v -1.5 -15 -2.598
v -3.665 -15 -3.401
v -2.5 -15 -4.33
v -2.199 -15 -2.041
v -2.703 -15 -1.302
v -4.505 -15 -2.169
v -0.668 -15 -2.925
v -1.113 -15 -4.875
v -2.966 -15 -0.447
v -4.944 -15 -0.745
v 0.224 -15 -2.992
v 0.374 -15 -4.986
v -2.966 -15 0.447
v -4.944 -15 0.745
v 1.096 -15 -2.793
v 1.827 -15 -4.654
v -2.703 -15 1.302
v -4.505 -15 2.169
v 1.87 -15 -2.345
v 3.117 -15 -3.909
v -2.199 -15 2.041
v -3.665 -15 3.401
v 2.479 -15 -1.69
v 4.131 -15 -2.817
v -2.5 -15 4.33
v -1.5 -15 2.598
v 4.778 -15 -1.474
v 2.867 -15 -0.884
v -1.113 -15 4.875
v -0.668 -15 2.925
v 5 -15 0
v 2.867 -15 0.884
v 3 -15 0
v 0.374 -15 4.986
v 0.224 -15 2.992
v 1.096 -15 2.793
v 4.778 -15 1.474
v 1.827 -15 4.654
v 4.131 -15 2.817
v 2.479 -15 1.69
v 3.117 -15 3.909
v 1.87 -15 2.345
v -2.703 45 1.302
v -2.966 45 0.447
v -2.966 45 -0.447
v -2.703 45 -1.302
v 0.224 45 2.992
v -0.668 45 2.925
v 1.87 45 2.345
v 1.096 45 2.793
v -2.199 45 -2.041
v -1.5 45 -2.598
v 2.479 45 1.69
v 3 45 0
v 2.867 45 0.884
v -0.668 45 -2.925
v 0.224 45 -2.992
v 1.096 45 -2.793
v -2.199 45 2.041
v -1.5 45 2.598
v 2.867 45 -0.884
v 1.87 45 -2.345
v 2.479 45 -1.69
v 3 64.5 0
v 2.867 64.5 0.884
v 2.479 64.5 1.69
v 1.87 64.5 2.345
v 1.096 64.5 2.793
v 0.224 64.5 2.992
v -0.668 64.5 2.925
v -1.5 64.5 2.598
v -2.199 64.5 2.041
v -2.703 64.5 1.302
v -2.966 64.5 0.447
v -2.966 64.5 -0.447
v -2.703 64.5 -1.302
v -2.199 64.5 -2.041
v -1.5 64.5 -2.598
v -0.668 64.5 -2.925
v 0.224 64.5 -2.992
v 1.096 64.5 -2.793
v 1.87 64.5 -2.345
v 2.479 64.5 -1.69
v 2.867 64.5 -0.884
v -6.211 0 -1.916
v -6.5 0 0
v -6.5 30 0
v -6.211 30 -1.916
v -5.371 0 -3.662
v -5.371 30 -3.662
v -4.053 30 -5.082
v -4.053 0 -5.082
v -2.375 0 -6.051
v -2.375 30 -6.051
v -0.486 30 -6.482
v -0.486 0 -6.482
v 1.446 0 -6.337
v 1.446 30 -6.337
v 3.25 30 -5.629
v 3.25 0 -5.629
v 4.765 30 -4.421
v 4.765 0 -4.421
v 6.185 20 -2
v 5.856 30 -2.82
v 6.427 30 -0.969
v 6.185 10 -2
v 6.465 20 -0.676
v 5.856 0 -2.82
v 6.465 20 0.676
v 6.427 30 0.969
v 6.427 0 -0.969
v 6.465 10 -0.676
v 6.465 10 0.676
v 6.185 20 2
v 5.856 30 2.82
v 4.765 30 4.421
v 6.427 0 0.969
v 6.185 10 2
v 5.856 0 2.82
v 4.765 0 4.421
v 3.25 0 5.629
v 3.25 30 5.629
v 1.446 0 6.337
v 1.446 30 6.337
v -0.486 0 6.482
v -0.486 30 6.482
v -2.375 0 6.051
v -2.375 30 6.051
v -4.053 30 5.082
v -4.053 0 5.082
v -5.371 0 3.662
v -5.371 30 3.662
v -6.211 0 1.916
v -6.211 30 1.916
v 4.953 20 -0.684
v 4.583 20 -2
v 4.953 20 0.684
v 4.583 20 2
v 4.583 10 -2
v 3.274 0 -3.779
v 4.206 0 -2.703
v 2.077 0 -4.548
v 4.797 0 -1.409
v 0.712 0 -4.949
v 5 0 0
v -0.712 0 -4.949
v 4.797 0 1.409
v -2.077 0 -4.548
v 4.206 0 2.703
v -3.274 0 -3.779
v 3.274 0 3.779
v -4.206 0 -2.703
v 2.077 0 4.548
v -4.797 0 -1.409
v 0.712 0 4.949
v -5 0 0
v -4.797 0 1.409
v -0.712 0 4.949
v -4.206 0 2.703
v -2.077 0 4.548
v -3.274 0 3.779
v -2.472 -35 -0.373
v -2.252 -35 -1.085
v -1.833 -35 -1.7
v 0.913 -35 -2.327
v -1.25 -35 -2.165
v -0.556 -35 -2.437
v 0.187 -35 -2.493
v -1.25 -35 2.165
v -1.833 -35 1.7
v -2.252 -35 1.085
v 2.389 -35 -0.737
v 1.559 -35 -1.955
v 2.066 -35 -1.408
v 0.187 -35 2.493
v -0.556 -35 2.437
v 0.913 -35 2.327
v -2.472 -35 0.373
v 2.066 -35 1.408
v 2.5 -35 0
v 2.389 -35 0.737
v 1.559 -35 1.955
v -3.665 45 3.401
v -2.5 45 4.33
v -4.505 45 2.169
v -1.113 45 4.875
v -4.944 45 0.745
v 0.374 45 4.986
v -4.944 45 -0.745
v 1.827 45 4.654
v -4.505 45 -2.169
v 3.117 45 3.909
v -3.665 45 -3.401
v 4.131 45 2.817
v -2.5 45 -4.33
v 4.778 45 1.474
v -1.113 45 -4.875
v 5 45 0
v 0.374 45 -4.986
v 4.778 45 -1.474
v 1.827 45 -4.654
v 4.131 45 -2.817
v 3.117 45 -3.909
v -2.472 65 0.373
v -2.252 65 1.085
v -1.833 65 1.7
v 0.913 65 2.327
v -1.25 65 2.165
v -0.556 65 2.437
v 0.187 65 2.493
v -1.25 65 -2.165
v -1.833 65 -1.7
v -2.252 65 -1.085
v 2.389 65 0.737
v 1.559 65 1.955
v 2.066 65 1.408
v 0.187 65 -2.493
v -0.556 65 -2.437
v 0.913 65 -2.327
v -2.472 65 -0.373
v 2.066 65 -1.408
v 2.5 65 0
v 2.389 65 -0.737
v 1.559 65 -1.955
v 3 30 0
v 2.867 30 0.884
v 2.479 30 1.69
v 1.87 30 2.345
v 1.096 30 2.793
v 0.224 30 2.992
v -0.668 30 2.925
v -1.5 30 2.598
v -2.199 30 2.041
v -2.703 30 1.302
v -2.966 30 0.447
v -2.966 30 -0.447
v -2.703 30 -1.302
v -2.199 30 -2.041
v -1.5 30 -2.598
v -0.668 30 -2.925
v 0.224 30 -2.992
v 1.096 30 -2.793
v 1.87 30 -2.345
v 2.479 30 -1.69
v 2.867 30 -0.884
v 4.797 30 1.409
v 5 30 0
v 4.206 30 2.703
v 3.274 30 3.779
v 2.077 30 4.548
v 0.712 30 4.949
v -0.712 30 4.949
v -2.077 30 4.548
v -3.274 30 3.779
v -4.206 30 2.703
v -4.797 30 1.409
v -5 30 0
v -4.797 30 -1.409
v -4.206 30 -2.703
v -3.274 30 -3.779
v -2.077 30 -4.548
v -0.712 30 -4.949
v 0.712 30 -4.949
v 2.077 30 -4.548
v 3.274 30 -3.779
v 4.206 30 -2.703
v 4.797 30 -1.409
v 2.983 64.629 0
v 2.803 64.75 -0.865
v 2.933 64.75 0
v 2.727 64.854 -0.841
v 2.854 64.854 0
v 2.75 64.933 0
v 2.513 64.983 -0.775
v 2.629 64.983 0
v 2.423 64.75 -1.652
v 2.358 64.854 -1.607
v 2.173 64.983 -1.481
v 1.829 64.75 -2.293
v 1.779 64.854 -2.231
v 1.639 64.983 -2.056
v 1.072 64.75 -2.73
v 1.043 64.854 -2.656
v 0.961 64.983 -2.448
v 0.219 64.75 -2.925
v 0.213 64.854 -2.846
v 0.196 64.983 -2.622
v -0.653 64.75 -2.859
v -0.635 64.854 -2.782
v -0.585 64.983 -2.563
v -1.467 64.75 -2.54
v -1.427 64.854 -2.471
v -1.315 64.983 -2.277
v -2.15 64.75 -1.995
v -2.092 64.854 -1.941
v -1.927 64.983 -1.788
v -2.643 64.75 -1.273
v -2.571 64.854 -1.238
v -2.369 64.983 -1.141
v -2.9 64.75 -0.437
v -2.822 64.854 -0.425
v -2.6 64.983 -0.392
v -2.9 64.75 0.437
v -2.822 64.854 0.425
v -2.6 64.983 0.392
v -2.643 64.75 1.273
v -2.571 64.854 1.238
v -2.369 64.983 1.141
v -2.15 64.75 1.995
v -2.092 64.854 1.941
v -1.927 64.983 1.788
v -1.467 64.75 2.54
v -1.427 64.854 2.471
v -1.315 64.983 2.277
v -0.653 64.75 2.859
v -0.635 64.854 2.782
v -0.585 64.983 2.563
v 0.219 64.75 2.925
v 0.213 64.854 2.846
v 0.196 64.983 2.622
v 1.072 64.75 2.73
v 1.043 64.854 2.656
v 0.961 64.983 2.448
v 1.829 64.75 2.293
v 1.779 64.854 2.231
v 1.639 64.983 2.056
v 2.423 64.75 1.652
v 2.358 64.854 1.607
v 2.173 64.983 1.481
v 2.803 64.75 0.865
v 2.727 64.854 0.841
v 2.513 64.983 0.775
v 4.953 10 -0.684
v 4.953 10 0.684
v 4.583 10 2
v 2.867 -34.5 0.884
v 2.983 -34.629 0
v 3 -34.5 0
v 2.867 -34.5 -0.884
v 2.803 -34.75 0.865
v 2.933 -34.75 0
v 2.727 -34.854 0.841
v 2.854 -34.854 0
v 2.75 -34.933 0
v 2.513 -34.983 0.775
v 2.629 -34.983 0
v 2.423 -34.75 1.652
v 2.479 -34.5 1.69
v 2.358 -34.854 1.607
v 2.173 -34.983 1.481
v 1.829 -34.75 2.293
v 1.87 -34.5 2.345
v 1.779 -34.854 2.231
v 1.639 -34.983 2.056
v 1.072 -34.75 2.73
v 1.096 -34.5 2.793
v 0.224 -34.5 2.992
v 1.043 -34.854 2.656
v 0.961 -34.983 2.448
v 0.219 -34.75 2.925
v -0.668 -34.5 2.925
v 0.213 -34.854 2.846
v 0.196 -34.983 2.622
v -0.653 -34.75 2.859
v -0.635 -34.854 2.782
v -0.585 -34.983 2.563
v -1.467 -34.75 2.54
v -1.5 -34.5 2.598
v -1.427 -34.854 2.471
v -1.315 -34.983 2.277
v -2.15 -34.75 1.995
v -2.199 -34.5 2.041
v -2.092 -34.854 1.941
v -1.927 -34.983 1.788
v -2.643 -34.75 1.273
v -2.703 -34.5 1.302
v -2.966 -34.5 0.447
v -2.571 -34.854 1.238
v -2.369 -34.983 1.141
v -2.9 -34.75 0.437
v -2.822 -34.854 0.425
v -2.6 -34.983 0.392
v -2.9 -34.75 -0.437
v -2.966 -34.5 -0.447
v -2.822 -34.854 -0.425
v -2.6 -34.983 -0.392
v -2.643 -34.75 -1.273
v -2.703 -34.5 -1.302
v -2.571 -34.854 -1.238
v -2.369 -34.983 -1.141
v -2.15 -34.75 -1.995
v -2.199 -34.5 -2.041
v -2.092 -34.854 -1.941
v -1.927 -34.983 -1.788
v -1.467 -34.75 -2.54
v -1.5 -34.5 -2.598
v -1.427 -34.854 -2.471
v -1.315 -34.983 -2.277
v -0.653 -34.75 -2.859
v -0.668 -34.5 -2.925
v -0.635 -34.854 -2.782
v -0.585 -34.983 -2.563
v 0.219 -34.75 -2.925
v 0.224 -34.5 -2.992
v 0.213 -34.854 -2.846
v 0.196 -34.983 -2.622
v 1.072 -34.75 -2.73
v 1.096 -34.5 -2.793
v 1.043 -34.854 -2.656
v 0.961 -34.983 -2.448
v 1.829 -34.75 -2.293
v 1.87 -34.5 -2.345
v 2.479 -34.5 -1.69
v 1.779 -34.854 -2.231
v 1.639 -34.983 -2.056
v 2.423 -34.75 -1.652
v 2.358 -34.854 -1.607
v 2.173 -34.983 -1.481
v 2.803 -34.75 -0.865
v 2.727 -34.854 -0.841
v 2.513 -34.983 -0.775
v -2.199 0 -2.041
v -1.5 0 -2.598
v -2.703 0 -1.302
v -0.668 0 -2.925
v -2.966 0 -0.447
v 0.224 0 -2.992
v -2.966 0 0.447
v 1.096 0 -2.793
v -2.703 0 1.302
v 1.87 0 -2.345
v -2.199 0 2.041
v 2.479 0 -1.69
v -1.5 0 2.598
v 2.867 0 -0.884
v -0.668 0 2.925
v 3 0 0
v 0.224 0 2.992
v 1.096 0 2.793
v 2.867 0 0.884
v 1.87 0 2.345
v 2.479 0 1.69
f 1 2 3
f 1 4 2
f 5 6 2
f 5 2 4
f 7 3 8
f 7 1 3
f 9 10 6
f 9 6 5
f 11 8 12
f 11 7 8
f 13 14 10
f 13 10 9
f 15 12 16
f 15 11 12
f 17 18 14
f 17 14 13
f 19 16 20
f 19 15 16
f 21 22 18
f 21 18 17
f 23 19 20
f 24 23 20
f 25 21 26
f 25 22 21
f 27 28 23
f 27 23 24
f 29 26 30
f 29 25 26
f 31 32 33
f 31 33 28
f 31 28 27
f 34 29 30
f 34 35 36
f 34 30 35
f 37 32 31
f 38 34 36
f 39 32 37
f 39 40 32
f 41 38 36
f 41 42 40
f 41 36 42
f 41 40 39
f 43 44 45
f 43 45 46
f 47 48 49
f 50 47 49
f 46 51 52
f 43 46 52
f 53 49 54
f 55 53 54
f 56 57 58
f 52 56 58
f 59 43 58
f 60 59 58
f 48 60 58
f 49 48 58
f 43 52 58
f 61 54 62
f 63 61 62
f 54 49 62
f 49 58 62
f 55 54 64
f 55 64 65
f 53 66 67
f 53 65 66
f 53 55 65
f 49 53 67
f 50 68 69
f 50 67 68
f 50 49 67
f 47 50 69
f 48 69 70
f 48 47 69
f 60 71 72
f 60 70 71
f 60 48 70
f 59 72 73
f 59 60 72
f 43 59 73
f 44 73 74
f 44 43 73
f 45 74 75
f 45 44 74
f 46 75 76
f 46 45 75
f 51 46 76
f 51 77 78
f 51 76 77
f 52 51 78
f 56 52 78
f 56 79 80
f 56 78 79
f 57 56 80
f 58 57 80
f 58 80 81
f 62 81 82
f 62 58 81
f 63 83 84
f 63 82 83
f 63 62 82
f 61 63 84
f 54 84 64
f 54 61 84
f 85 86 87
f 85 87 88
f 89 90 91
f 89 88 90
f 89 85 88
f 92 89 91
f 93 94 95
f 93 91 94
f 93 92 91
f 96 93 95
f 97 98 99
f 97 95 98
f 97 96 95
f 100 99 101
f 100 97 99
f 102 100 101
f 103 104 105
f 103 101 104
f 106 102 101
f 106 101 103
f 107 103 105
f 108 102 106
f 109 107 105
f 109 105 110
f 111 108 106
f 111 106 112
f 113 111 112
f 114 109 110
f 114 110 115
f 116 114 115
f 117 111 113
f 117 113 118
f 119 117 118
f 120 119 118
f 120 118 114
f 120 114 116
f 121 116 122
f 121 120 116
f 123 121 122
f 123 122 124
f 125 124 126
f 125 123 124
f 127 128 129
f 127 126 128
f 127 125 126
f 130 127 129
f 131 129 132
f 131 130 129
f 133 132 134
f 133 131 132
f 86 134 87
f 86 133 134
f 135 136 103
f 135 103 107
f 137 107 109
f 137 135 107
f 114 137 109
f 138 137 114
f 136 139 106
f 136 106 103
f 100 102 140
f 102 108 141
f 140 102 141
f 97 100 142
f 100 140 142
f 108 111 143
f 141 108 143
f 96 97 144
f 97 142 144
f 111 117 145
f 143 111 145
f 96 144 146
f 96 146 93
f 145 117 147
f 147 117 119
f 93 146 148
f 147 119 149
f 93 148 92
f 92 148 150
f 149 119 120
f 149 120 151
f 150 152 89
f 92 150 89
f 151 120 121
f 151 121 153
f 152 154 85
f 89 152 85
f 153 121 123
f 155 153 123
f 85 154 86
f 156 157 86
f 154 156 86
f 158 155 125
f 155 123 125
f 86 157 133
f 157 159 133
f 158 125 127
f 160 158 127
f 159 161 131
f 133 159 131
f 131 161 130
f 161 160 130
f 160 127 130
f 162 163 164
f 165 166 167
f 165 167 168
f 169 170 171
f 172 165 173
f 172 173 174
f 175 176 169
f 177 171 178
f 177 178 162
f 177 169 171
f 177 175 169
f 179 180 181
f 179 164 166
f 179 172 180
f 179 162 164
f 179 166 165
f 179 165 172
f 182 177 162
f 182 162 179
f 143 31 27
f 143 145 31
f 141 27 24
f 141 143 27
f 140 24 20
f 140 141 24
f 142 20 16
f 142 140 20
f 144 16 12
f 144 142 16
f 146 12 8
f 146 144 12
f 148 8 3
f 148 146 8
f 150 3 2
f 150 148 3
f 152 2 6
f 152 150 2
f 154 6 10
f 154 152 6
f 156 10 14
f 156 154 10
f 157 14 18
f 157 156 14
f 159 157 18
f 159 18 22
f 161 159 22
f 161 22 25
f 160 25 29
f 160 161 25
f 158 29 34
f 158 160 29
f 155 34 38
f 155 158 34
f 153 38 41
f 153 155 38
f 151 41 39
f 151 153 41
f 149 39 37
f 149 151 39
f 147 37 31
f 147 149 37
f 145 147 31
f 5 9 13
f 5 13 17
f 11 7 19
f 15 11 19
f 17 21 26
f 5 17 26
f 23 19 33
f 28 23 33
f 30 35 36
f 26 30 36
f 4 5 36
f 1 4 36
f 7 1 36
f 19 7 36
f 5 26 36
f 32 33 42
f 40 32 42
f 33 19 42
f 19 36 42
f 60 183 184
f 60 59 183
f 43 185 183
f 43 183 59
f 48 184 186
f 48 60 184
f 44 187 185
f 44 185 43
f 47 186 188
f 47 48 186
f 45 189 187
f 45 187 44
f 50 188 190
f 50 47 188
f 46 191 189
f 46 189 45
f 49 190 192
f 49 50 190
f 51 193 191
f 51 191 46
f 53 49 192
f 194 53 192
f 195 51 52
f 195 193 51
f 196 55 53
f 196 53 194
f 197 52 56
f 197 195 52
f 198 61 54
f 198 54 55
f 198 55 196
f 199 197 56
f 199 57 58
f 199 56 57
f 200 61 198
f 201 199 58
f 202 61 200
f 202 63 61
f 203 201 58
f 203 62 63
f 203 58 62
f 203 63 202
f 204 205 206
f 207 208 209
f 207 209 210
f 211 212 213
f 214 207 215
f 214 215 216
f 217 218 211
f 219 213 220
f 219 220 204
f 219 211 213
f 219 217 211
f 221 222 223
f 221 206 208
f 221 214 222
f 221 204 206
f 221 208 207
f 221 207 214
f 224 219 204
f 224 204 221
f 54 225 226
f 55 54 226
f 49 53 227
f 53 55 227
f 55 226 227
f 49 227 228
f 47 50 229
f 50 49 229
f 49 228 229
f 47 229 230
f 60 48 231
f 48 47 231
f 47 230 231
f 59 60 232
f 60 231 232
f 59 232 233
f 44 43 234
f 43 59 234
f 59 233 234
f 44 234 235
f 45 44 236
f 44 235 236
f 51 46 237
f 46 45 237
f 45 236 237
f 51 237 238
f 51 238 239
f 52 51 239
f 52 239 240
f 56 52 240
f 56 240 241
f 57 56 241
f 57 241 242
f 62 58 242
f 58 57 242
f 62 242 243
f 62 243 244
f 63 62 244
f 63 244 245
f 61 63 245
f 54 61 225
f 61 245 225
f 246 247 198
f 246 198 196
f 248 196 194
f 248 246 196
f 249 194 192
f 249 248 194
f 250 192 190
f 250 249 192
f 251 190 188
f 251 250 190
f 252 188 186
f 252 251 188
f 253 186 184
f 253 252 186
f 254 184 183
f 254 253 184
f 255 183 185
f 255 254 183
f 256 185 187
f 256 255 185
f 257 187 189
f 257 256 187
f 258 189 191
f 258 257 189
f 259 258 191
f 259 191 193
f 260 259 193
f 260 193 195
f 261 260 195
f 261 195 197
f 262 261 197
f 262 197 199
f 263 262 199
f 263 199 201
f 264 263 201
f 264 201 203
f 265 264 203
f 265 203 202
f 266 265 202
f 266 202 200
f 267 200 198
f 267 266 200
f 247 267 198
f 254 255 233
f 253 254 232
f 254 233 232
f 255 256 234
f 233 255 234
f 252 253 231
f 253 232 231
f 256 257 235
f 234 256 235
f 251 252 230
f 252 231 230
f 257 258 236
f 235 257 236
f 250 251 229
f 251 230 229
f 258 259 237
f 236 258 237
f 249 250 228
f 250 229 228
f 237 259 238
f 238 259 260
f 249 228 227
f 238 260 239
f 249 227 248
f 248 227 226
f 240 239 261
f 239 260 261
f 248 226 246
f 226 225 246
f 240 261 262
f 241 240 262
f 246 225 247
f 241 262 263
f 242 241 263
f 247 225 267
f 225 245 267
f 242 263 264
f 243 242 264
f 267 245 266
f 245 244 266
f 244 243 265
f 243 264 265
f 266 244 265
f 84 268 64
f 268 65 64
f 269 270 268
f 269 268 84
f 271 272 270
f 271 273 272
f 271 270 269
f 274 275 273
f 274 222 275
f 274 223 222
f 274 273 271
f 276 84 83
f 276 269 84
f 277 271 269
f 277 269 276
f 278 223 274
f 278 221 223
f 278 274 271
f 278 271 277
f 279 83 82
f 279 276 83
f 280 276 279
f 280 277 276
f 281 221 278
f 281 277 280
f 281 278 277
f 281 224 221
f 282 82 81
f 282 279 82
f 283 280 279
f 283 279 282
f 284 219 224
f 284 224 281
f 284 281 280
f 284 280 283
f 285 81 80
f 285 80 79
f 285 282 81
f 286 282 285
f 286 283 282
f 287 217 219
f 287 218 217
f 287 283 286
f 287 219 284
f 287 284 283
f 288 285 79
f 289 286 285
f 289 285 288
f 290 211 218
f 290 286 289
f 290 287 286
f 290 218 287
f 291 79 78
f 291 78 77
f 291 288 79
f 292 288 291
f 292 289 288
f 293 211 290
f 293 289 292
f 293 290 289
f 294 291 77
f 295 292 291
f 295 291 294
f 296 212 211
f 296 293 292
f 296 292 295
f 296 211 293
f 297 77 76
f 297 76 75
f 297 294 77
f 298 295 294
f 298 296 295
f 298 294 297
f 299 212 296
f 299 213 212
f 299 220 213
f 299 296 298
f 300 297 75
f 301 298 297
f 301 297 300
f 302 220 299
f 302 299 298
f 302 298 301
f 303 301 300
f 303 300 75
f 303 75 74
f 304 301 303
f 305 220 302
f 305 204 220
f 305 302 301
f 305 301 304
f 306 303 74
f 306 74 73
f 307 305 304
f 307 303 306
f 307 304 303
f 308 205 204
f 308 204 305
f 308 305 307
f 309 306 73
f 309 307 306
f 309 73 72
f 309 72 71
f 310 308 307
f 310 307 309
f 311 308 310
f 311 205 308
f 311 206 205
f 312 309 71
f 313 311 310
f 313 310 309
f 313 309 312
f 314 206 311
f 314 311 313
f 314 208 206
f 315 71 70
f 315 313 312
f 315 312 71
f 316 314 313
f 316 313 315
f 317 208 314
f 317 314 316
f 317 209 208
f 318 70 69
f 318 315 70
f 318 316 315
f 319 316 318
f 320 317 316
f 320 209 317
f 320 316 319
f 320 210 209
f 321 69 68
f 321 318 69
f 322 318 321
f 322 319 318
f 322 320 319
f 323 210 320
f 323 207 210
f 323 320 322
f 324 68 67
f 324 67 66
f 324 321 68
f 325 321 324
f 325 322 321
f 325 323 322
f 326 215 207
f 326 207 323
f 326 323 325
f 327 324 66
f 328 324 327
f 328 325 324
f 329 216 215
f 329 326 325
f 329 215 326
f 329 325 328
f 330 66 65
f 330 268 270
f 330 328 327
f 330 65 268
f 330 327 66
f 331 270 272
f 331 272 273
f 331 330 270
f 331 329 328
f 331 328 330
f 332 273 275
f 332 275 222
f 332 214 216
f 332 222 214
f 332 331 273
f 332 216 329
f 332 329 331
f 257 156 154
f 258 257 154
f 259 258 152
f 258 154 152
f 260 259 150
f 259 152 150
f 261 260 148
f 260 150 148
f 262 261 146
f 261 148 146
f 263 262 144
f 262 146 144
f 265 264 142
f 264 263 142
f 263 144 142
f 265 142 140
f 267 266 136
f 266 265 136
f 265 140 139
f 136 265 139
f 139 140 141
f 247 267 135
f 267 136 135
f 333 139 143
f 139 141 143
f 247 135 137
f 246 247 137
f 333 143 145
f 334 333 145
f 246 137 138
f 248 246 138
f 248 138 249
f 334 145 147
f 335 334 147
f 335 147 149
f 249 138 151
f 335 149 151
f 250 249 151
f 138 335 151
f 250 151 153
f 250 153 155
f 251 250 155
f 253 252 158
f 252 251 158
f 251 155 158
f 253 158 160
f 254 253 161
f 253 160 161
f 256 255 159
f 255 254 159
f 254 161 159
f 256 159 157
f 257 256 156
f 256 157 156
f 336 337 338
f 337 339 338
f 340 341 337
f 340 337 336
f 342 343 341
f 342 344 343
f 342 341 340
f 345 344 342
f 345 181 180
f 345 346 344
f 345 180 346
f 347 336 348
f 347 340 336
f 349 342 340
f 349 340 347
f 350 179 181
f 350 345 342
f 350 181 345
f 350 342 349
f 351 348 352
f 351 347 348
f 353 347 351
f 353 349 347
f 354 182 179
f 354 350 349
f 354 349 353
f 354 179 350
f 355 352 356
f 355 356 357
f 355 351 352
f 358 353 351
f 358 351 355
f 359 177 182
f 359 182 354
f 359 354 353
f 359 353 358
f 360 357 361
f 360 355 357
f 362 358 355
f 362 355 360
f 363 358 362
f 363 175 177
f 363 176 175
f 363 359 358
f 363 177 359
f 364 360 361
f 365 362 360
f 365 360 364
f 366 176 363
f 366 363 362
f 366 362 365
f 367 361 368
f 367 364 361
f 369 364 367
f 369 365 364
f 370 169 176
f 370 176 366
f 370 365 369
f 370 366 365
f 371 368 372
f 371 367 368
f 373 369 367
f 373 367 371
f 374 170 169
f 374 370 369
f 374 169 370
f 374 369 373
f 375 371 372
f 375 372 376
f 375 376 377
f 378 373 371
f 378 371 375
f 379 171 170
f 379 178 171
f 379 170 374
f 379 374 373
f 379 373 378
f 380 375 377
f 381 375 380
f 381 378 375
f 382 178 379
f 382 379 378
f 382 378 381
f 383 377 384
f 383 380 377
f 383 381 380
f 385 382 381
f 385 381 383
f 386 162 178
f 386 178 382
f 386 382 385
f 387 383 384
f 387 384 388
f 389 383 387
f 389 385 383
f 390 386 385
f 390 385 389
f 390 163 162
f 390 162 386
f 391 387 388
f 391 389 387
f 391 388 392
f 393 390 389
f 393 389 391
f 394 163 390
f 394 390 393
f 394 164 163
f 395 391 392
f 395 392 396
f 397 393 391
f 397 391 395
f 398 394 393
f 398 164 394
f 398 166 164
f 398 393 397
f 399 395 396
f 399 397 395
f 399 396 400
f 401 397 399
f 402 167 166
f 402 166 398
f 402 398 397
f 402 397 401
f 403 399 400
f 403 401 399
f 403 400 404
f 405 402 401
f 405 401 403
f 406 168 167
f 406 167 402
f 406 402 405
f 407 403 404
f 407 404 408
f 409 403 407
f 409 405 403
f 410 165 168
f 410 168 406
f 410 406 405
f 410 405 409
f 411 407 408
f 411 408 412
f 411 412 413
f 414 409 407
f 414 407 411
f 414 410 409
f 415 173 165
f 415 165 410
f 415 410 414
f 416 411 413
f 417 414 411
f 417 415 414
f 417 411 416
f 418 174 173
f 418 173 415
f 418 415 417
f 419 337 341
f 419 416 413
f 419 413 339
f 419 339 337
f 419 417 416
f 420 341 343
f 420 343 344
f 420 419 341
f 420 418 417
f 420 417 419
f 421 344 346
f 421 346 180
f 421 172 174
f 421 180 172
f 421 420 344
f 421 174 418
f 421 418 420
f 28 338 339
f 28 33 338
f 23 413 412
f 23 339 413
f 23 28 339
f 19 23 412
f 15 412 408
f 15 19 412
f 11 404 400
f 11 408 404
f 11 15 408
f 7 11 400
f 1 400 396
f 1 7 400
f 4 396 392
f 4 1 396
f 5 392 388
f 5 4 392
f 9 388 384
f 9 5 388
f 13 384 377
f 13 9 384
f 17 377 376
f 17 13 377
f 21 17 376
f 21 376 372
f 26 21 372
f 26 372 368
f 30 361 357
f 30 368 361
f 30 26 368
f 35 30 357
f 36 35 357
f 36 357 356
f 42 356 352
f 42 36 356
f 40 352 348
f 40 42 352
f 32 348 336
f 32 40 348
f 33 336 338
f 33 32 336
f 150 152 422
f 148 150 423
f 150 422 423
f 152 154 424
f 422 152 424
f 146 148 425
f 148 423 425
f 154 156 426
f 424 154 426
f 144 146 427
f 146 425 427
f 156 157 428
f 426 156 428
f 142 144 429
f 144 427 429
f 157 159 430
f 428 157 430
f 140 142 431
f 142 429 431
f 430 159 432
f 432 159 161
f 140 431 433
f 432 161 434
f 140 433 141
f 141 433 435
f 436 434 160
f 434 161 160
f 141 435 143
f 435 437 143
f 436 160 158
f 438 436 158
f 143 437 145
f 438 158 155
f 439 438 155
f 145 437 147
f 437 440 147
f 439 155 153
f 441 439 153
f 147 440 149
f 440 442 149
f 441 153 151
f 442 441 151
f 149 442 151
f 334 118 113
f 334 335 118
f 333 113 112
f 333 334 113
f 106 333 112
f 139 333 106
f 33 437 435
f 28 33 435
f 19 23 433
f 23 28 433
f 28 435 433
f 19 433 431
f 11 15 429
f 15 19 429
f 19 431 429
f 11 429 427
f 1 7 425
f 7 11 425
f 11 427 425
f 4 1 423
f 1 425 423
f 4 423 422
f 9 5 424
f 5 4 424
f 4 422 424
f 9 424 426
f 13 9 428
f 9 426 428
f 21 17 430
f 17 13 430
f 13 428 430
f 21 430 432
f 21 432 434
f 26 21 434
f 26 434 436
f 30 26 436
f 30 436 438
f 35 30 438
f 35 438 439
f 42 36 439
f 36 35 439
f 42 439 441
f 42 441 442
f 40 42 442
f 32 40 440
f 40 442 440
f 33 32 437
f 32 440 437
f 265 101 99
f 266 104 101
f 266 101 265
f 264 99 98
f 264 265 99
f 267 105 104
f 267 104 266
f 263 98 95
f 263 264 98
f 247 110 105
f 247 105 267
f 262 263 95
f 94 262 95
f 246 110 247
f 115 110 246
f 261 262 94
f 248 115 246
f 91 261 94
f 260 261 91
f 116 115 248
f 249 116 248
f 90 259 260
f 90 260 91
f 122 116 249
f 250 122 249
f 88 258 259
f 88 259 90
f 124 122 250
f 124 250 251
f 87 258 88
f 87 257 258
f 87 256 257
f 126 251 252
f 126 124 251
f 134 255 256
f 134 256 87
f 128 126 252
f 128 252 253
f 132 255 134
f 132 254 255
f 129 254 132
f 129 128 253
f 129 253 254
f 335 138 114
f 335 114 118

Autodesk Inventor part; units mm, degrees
ref_plane "YZ Plane" through (0, 0, 0) normal (1, 0, 0) x (0, 1, 0)
ref_plane "XZ Plane" through (0, 0, 0) normal (0, 1, 0) x (-1, 0, 0)
ref_plane "XY Plane" through (0, 0, 0) normal (0, 0, 1) x (1, 0, 0)
sketch "Sketch1" plane through (0, 0, 0) normal (0, 1, 0) x (-1, 0, 0)
  circle A0 centre (0, 0) radius 6.5
  circle A1 centre (0, 0) radius 5
extrude "Extrusion1" add sketch "Sketch1" along normal blind 30
sketch "Sketch2" plane through (0, 0, 0) normal (1, 0, 0) x (0, 1, 0)
  line L0 (0, 0) -> (15, 0) construction
  line L1 (10, -2) -> (20, -2)
  line L2 (20, -2) -> (20, 2)
  line L3 (20, 2) -> (10, 2)
  line L4 (10, 2) -> (10, -2)
  line L5 (10, -2) -> (20, 2) construction
  line L6 (20, -2) -> (10, 2) construction
  dimension "d4" = 10
  dimension "d5" = 4
extrude "Extrusion2" cut sketch "Sketch2" along normal blind 30
sketch "Sketch3" plane through (0, 0, 0) normal (0, -1, 0) x (1, 0, 0)
  circle A0 centre (0, 0) radius 5
  circle A1 centre (0, 0) radius 3
  dimension "d8" = 6
extrude "Extrusion3" add sketch "Sketch3" along normal blind 15
sketch "Sketch4" plane through (0, 30, 0) normal (0, 1, 0) x (1, 0, 0)
  circle A0 centre (0, 0) radius 5
  circle A1 centre (0, 0) radius 3
extrude "Extrusion4" add sketch "Sketch4" along normal blind 15
sketch "Sketch5" plane through (0, -15, 0) normal (0, -1, 0) x (1, 0, 0)
  circle A0 centre (0, 0) radius 3
extrude "Extrusion5" add sketch "Sketch5" along normal blind 20
sketch "Sketch6" plane through (0, 45, 0) normal (0, 1, 0) x (1, 0, 0)
  circle A0 centre (0, 0) radius 3
extrude "Extrusion6" add sketch "Sketch6" along normal blind 20
thread "Thread1" size "M6x1" class "6g" standard "ANSI Metric M Profile" length 10
thread "Thread2" size "M6x1" class "6g" standard "ANSI Metric M Profile" length 10
fillet "Fillet1" radius 0.5 2 edges at (-3, -35, 0) (-3, 65, 0)
properties part number "Traversa"
